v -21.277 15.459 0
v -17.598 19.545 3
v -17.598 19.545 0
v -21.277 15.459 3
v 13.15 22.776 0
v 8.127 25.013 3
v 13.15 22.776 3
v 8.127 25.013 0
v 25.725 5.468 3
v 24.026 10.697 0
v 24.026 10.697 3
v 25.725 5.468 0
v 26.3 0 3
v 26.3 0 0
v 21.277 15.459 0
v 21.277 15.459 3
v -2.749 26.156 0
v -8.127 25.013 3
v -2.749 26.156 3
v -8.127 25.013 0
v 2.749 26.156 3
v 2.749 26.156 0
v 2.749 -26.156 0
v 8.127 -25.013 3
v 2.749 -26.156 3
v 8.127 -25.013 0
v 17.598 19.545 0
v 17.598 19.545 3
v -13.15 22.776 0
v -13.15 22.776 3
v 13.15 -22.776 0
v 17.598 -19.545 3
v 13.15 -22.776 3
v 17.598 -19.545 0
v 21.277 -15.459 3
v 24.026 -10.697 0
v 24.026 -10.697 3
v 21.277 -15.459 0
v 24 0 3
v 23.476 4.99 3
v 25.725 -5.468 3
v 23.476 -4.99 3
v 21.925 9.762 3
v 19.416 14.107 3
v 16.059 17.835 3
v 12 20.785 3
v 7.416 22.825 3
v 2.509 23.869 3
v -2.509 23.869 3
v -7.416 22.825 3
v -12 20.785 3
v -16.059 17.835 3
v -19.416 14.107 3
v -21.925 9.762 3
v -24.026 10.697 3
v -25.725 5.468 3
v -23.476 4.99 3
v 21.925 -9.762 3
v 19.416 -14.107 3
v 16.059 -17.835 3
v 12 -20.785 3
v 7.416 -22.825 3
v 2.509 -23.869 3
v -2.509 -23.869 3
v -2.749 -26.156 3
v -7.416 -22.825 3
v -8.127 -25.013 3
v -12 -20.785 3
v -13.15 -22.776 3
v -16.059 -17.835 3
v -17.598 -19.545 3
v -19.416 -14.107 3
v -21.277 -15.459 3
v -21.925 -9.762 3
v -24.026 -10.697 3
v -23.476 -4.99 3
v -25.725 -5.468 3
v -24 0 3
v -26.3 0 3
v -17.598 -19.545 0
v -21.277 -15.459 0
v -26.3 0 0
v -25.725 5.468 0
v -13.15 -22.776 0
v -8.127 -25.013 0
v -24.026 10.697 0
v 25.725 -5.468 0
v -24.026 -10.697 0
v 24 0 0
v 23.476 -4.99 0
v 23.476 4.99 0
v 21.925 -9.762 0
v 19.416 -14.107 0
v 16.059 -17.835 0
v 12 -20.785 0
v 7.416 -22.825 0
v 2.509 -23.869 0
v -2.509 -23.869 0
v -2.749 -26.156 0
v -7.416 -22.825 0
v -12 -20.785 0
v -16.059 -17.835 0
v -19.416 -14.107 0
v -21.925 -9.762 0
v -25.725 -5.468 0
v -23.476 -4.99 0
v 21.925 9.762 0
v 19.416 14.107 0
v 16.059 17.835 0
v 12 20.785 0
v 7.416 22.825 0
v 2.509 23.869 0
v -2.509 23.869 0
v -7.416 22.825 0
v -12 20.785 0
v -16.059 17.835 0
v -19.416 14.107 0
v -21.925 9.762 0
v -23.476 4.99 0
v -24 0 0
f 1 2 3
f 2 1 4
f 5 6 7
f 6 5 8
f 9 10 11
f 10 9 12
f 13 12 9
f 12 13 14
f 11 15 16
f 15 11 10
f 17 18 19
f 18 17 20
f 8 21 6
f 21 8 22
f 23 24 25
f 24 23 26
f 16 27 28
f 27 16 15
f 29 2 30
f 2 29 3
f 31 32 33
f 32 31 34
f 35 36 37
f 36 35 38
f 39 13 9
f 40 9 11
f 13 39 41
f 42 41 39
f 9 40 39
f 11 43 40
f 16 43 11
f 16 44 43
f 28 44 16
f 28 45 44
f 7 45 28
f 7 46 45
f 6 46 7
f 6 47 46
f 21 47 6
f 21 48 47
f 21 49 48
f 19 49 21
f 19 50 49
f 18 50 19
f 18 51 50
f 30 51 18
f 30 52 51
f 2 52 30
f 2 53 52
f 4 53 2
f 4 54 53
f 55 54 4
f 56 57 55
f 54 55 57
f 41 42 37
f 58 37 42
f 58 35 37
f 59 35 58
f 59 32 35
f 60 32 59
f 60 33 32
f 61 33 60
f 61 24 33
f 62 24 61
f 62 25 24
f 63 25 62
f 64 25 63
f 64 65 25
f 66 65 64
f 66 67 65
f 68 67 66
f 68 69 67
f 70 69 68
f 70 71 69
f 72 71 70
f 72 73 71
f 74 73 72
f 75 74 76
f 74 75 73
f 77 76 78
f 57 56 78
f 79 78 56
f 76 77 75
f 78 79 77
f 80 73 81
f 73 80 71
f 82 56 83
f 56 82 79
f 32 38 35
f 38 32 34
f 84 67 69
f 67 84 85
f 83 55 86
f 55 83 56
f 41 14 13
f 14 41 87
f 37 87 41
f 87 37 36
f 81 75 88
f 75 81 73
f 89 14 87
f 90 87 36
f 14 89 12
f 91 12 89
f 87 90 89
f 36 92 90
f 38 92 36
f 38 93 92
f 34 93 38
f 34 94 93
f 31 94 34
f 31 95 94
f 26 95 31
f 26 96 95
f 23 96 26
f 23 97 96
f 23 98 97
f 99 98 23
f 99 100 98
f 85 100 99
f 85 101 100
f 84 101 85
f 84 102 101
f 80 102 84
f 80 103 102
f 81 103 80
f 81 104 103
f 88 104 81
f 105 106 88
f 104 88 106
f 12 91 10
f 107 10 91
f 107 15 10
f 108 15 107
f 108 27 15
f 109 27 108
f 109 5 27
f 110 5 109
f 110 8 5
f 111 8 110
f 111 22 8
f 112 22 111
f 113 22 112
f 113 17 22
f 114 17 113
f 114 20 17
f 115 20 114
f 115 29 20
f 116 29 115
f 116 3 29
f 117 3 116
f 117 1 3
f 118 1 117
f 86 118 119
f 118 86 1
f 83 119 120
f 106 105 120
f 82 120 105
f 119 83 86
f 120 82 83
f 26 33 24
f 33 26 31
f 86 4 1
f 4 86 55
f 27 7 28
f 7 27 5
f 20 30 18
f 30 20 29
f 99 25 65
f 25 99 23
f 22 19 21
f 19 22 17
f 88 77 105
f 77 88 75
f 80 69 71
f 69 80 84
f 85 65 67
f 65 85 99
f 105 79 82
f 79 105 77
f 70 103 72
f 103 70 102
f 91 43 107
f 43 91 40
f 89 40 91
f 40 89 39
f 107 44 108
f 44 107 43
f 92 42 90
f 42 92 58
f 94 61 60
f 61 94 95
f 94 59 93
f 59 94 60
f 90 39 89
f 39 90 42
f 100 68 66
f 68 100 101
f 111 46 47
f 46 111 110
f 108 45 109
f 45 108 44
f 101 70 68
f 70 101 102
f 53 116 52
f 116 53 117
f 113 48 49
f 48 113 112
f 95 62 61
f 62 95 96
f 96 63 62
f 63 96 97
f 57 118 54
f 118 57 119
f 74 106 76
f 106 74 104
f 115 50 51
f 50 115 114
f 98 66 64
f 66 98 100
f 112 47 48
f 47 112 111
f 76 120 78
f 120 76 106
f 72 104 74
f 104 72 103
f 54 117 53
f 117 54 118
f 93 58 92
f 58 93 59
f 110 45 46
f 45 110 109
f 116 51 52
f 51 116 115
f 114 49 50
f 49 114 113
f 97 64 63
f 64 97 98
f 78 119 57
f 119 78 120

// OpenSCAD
difference(){
	cylinder(r=26.3,h=3);
	cylinder(r=24,h=3);

}
